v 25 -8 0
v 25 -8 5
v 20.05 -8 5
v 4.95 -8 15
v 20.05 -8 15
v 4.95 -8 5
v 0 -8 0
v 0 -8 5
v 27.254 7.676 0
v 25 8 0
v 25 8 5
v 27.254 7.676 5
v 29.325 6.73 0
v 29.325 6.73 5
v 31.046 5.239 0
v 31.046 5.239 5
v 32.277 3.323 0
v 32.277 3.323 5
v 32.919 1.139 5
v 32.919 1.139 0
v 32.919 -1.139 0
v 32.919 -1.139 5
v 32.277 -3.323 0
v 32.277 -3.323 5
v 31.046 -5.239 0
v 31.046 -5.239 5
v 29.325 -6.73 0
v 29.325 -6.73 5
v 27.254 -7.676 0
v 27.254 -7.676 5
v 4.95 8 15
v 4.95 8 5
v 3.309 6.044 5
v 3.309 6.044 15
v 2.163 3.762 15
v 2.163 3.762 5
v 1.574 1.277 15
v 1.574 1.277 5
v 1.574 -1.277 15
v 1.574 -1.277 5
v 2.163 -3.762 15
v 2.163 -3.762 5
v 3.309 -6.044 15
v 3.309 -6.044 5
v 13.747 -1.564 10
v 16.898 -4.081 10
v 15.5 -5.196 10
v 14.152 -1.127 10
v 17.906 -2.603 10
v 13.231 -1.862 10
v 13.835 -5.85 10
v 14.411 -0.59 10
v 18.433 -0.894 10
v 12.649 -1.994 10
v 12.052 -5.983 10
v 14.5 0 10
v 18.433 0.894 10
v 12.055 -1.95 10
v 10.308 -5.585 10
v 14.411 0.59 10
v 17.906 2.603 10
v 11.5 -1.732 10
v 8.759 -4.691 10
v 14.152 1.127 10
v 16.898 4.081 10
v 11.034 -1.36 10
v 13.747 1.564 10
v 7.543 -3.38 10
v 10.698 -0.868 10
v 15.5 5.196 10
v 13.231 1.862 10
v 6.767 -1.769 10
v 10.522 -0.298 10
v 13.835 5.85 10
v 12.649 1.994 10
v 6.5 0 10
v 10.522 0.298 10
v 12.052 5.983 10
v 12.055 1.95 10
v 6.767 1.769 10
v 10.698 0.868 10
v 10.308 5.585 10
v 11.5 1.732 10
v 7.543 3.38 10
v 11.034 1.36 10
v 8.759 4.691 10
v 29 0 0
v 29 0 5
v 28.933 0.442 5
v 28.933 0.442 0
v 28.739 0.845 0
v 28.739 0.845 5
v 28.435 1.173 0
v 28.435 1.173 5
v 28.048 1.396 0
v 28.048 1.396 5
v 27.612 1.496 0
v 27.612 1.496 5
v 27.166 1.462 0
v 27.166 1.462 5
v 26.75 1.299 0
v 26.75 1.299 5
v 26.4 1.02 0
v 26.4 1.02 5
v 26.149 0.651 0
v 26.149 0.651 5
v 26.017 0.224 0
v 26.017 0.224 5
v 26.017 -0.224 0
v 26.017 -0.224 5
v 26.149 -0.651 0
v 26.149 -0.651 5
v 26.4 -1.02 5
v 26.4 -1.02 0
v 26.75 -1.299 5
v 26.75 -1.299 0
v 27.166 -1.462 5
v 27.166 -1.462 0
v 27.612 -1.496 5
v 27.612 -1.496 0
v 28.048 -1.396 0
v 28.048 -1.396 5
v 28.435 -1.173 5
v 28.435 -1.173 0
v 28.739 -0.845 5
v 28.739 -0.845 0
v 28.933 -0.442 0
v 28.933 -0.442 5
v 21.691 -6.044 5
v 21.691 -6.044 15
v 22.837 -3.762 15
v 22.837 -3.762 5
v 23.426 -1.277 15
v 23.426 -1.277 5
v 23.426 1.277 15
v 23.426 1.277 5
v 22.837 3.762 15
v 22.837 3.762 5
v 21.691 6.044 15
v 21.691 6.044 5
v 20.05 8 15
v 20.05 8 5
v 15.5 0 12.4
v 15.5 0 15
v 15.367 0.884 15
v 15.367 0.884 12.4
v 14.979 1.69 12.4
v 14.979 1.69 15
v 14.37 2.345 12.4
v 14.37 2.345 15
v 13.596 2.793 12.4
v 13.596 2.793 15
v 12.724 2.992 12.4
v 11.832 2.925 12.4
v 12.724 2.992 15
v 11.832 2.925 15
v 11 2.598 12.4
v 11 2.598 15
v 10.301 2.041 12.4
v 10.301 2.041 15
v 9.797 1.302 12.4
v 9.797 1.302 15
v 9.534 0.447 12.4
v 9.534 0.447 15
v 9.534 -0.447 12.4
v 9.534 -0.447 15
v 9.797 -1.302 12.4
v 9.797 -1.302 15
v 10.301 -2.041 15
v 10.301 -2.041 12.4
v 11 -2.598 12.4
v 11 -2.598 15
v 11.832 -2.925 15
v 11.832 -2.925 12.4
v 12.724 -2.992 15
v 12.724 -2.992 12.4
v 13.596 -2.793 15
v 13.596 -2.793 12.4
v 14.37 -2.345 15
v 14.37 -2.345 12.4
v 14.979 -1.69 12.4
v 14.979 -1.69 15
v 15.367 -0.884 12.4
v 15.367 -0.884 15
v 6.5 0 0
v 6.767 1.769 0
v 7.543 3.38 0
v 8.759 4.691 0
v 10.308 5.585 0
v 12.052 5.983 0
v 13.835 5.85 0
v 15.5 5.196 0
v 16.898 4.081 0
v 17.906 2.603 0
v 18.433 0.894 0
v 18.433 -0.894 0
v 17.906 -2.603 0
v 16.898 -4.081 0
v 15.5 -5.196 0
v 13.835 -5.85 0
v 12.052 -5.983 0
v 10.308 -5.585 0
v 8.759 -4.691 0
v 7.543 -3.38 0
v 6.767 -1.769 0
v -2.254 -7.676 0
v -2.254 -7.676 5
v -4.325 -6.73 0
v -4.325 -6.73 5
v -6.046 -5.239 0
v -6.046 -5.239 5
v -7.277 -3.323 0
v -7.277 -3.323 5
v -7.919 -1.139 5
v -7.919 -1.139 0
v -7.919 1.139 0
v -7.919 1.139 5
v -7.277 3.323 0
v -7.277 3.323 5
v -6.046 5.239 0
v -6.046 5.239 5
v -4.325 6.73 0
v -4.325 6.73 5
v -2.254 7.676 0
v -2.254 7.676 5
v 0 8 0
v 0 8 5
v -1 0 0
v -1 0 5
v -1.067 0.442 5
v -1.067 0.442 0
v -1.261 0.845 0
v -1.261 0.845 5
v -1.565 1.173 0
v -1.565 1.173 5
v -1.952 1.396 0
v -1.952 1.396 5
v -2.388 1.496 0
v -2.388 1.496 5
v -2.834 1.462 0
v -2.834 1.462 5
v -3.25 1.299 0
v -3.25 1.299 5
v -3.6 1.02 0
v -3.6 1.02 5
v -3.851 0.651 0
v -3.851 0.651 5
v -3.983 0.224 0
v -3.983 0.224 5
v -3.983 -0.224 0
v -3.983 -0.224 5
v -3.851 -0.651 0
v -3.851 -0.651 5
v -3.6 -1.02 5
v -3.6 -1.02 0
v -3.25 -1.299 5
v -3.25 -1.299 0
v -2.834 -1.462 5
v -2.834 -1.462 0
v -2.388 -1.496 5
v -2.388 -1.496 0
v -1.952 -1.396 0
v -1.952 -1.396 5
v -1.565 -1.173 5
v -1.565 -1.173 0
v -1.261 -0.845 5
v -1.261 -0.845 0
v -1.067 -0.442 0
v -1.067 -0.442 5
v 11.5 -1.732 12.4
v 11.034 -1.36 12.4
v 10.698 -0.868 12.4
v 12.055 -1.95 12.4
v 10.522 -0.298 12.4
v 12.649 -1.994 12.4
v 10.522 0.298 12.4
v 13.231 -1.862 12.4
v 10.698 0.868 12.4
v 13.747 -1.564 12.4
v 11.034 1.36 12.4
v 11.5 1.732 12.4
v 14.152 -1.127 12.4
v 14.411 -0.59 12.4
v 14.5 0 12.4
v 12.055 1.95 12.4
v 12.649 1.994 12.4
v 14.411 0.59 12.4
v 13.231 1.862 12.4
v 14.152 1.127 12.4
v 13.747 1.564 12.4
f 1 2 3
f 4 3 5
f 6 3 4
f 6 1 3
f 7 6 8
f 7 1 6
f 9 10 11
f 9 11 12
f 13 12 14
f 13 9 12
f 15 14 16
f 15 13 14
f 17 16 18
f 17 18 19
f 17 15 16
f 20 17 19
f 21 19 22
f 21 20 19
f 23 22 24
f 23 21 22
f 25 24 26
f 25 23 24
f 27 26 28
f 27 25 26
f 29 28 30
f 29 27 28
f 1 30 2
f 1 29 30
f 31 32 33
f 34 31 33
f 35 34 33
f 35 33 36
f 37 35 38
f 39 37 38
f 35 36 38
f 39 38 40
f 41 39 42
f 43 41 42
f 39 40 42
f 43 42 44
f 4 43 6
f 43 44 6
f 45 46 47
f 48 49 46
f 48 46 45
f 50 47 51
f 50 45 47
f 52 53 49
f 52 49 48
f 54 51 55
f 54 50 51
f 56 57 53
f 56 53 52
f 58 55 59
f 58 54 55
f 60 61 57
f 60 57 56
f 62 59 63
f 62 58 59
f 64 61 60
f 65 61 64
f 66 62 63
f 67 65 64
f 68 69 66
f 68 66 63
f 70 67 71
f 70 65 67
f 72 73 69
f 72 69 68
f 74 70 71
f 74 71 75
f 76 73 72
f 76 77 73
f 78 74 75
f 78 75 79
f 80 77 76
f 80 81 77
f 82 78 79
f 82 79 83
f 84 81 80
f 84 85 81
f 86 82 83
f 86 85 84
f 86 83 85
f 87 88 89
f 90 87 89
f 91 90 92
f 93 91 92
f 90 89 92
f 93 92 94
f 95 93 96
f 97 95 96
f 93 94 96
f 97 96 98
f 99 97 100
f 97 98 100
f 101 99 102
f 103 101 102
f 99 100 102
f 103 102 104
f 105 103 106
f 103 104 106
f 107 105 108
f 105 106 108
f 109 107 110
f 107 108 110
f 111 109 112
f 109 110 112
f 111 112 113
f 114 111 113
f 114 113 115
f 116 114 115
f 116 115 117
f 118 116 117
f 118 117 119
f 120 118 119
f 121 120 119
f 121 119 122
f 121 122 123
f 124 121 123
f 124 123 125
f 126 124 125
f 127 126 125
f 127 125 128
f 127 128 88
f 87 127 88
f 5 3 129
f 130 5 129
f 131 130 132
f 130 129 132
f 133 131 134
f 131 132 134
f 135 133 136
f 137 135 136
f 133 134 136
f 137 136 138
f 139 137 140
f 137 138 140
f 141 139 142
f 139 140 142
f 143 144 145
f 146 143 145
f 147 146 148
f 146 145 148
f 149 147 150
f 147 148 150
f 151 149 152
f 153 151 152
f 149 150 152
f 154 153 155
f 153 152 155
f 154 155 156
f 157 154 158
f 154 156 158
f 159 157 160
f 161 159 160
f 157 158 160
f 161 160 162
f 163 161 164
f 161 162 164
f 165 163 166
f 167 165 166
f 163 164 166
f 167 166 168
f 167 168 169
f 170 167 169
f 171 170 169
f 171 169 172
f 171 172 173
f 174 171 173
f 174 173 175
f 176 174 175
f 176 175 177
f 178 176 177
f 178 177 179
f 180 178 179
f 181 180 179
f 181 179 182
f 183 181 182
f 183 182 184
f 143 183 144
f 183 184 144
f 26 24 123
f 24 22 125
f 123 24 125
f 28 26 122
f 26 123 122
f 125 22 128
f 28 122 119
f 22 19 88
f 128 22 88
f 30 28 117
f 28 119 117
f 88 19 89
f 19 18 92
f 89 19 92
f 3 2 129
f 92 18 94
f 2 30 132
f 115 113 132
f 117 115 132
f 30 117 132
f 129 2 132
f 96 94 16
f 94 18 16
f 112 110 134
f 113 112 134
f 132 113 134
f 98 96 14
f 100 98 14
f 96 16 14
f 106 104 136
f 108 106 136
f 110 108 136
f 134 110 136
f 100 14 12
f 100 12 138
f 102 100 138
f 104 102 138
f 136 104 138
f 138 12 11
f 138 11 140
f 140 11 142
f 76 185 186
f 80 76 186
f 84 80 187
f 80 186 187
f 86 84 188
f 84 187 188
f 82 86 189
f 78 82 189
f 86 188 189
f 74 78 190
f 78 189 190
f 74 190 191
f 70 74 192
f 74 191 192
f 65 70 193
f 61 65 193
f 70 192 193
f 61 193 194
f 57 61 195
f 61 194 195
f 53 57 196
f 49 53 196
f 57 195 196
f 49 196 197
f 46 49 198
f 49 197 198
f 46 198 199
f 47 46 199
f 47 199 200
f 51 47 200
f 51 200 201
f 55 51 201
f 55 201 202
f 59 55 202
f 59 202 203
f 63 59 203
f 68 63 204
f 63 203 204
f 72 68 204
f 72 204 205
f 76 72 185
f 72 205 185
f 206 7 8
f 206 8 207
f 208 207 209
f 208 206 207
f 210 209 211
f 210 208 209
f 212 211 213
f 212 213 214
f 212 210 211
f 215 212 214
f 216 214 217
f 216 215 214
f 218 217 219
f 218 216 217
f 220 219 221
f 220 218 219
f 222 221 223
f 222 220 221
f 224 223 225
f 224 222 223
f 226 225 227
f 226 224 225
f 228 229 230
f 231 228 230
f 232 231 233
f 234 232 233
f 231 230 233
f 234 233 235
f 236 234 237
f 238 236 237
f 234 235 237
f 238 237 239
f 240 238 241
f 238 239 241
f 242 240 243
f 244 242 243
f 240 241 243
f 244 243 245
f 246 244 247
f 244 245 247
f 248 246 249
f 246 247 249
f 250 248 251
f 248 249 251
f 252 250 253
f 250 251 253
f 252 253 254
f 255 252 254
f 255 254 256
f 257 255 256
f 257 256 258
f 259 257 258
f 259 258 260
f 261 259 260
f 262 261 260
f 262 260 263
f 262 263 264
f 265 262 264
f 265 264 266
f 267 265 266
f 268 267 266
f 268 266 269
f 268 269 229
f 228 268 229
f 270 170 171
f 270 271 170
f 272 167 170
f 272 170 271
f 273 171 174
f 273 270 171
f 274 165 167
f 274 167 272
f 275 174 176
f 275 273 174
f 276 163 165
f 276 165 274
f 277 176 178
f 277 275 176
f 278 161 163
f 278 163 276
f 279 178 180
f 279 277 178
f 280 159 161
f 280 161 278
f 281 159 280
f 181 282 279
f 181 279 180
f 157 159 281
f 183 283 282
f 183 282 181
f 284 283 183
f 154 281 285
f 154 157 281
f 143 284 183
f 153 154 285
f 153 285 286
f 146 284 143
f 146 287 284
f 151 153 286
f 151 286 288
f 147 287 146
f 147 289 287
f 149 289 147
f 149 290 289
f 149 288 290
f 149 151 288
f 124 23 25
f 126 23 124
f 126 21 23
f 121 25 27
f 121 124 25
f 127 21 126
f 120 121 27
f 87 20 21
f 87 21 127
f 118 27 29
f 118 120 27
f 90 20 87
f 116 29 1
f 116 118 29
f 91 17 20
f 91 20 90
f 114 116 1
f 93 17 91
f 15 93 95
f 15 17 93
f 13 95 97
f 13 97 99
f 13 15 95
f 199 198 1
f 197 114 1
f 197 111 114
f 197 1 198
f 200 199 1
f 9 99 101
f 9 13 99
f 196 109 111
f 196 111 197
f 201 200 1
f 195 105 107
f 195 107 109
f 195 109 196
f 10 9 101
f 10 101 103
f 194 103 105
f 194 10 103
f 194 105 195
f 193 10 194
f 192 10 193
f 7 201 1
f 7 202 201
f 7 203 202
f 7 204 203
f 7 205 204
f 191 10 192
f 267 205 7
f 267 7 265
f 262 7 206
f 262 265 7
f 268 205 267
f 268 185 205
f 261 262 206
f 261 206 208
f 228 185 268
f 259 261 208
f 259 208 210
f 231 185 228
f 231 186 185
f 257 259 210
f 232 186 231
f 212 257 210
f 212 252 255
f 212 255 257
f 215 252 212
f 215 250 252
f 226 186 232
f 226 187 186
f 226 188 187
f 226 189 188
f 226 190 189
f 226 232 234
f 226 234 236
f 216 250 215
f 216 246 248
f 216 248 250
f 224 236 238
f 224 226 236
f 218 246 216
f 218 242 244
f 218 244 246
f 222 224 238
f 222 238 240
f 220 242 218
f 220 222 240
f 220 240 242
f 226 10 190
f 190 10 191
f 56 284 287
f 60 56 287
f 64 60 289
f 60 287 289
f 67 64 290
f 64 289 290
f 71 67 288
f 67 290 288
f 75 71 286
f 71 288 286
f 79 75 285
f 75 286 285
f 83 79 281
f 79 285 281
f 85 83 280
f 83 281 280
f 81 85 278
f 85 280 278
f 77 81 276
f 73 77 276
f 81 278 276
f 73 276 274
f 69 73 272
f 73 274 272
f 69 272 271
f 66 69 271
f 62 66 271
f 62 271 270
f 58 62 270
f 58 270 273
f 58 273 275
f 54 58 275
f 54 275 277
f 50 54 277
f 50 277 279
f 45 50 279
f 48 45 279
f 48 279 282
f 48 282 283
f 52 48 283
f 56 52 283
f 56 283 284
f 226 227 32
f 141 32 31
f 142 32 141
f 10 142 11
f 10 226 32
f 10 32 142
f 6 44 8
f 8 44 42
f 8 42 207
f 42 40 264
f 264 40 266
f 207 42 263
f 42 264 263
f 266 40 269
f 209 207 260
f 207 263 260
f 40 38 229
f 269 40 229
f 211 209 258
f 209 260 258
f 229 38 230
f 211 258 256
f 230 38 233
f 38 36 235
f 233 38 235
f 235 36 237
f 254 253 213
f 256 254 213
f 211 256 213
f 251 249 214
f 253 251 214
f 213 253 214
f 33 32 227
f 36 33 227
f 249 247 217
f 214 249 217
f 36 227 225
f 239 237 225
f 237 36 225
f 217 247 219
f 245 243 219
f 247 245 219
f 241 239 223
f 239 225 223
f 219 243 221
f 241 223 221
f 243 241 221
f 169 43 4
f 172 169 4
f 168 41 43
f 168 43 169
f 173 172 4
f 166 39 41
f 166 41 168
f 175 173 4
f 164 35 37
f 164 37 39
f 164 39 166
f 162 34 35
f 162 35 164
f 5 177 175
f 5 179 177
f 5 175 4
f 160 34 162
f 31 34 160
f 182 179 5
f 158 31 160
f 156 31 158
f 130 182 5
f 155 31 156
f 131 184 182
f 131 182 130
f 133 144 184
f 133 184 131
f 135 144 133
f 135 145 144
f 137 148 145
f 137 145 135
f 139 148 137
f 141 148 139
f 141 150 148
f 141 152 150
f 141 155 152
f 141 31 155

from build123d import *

# Parameters (mm, degrees)
EXTRUDE_1_DEPTH     = 5
EXTRUDE_2_DEPTH     = 10
SKETCH_3_R          = 3
CUT_EXTRUDE_1_DEPTH = 2.6
SKETCH_4_R          = 2
CUT_EXTRUDE_2_DEPTH = 37.149135536
SKETCH_5_R          = 6
CUT_EXTRUDE_3_DEPTH = 10
SKETCH_6_R          = 1.5
CUT_EXTRUDE_4_DEPTH = 36.397740041


with BuildPart() as part:
    # 草图1 → 凸台-拉伸1 (new body)
    with BuildSketch(Plane.XY):
        with BuildLine():
            Line((0, 8), (25, 8))
            ThreePointArc((25, 8), (33, 0), (25, -8))
            Line((25, -8), (0, -8))
            ThreePointArc((0, -8), (-8, 0), (0, 8))
        make_face()
    extrude(amount=EXTRUDE_1_DEPTH)

    # 草图2 → 凸台-拉伸2 (add)
    with BuildSketch(Plane.XY.offset(5)):
        with BuildLine():
            Line((4.950165565, -8), (20.049834435, -8))
            ThreePointArc((20.049834435, -8), (23.5, 0), (20.049834435, 8))
            Line((20.049834435, 8), (4.950165565, 8))
            ThreePointArc((4.950165565, 8), (1.5, 0), (4.950165565, -8))
        make_face()
    extrude(amount=EXTRUDE_2_DEPTH)

    # 草图3 → 切除-拉伸1 (cut)
    with BuildSketch(Plane.XY.offset(15)):
        with Locations((12.5, 0)):
            Circle(SKETCH_3_R)
    extrude(amount=-CUT_EXTRUDE_1_DEPTH, mode=Mode.SUBTRACT)

    # 草图4 → 切除-拉伸2 (cut, through all)
    with BuildSketch(Plane.XY.offset(12.4)):
        with Locations((12.5, 0)):
            Circle(SKETCH_4_R)
    extrude(amount=-CUT_EXTRUDE_2_DEPTH, mode=Mode.SUBTRACT)

    # 草图5 → 切除-拉伸3 (cut)
    with BuildSketch(Plane(origin=(0, 0, 0), x_dir=(-1, 0, 0), z_dir=(0, 0, -1))):
        with Locations((-12.5, 0)):
            Circle(SKETCH_5_R)
    extrude(amount=-CUT_EXTRUDE_3_DEPTH, mode=Mode.SUBTRACT)

    # 草图6 → 切除-拉伸4 (cut, through all)
    with BuildSketch(Plane.XY.offset(5)):
        with Locations((-2.5, 0)):
            Circle(SKETCH_6_R)
        with Locations((27.5, 0)):
            Circle(SKETCH_6_R)
    extrude(amount=-CUT_EXTRUDE_4_DEPTH, mode=Mode.SUBTRACT)


solid = part.part
